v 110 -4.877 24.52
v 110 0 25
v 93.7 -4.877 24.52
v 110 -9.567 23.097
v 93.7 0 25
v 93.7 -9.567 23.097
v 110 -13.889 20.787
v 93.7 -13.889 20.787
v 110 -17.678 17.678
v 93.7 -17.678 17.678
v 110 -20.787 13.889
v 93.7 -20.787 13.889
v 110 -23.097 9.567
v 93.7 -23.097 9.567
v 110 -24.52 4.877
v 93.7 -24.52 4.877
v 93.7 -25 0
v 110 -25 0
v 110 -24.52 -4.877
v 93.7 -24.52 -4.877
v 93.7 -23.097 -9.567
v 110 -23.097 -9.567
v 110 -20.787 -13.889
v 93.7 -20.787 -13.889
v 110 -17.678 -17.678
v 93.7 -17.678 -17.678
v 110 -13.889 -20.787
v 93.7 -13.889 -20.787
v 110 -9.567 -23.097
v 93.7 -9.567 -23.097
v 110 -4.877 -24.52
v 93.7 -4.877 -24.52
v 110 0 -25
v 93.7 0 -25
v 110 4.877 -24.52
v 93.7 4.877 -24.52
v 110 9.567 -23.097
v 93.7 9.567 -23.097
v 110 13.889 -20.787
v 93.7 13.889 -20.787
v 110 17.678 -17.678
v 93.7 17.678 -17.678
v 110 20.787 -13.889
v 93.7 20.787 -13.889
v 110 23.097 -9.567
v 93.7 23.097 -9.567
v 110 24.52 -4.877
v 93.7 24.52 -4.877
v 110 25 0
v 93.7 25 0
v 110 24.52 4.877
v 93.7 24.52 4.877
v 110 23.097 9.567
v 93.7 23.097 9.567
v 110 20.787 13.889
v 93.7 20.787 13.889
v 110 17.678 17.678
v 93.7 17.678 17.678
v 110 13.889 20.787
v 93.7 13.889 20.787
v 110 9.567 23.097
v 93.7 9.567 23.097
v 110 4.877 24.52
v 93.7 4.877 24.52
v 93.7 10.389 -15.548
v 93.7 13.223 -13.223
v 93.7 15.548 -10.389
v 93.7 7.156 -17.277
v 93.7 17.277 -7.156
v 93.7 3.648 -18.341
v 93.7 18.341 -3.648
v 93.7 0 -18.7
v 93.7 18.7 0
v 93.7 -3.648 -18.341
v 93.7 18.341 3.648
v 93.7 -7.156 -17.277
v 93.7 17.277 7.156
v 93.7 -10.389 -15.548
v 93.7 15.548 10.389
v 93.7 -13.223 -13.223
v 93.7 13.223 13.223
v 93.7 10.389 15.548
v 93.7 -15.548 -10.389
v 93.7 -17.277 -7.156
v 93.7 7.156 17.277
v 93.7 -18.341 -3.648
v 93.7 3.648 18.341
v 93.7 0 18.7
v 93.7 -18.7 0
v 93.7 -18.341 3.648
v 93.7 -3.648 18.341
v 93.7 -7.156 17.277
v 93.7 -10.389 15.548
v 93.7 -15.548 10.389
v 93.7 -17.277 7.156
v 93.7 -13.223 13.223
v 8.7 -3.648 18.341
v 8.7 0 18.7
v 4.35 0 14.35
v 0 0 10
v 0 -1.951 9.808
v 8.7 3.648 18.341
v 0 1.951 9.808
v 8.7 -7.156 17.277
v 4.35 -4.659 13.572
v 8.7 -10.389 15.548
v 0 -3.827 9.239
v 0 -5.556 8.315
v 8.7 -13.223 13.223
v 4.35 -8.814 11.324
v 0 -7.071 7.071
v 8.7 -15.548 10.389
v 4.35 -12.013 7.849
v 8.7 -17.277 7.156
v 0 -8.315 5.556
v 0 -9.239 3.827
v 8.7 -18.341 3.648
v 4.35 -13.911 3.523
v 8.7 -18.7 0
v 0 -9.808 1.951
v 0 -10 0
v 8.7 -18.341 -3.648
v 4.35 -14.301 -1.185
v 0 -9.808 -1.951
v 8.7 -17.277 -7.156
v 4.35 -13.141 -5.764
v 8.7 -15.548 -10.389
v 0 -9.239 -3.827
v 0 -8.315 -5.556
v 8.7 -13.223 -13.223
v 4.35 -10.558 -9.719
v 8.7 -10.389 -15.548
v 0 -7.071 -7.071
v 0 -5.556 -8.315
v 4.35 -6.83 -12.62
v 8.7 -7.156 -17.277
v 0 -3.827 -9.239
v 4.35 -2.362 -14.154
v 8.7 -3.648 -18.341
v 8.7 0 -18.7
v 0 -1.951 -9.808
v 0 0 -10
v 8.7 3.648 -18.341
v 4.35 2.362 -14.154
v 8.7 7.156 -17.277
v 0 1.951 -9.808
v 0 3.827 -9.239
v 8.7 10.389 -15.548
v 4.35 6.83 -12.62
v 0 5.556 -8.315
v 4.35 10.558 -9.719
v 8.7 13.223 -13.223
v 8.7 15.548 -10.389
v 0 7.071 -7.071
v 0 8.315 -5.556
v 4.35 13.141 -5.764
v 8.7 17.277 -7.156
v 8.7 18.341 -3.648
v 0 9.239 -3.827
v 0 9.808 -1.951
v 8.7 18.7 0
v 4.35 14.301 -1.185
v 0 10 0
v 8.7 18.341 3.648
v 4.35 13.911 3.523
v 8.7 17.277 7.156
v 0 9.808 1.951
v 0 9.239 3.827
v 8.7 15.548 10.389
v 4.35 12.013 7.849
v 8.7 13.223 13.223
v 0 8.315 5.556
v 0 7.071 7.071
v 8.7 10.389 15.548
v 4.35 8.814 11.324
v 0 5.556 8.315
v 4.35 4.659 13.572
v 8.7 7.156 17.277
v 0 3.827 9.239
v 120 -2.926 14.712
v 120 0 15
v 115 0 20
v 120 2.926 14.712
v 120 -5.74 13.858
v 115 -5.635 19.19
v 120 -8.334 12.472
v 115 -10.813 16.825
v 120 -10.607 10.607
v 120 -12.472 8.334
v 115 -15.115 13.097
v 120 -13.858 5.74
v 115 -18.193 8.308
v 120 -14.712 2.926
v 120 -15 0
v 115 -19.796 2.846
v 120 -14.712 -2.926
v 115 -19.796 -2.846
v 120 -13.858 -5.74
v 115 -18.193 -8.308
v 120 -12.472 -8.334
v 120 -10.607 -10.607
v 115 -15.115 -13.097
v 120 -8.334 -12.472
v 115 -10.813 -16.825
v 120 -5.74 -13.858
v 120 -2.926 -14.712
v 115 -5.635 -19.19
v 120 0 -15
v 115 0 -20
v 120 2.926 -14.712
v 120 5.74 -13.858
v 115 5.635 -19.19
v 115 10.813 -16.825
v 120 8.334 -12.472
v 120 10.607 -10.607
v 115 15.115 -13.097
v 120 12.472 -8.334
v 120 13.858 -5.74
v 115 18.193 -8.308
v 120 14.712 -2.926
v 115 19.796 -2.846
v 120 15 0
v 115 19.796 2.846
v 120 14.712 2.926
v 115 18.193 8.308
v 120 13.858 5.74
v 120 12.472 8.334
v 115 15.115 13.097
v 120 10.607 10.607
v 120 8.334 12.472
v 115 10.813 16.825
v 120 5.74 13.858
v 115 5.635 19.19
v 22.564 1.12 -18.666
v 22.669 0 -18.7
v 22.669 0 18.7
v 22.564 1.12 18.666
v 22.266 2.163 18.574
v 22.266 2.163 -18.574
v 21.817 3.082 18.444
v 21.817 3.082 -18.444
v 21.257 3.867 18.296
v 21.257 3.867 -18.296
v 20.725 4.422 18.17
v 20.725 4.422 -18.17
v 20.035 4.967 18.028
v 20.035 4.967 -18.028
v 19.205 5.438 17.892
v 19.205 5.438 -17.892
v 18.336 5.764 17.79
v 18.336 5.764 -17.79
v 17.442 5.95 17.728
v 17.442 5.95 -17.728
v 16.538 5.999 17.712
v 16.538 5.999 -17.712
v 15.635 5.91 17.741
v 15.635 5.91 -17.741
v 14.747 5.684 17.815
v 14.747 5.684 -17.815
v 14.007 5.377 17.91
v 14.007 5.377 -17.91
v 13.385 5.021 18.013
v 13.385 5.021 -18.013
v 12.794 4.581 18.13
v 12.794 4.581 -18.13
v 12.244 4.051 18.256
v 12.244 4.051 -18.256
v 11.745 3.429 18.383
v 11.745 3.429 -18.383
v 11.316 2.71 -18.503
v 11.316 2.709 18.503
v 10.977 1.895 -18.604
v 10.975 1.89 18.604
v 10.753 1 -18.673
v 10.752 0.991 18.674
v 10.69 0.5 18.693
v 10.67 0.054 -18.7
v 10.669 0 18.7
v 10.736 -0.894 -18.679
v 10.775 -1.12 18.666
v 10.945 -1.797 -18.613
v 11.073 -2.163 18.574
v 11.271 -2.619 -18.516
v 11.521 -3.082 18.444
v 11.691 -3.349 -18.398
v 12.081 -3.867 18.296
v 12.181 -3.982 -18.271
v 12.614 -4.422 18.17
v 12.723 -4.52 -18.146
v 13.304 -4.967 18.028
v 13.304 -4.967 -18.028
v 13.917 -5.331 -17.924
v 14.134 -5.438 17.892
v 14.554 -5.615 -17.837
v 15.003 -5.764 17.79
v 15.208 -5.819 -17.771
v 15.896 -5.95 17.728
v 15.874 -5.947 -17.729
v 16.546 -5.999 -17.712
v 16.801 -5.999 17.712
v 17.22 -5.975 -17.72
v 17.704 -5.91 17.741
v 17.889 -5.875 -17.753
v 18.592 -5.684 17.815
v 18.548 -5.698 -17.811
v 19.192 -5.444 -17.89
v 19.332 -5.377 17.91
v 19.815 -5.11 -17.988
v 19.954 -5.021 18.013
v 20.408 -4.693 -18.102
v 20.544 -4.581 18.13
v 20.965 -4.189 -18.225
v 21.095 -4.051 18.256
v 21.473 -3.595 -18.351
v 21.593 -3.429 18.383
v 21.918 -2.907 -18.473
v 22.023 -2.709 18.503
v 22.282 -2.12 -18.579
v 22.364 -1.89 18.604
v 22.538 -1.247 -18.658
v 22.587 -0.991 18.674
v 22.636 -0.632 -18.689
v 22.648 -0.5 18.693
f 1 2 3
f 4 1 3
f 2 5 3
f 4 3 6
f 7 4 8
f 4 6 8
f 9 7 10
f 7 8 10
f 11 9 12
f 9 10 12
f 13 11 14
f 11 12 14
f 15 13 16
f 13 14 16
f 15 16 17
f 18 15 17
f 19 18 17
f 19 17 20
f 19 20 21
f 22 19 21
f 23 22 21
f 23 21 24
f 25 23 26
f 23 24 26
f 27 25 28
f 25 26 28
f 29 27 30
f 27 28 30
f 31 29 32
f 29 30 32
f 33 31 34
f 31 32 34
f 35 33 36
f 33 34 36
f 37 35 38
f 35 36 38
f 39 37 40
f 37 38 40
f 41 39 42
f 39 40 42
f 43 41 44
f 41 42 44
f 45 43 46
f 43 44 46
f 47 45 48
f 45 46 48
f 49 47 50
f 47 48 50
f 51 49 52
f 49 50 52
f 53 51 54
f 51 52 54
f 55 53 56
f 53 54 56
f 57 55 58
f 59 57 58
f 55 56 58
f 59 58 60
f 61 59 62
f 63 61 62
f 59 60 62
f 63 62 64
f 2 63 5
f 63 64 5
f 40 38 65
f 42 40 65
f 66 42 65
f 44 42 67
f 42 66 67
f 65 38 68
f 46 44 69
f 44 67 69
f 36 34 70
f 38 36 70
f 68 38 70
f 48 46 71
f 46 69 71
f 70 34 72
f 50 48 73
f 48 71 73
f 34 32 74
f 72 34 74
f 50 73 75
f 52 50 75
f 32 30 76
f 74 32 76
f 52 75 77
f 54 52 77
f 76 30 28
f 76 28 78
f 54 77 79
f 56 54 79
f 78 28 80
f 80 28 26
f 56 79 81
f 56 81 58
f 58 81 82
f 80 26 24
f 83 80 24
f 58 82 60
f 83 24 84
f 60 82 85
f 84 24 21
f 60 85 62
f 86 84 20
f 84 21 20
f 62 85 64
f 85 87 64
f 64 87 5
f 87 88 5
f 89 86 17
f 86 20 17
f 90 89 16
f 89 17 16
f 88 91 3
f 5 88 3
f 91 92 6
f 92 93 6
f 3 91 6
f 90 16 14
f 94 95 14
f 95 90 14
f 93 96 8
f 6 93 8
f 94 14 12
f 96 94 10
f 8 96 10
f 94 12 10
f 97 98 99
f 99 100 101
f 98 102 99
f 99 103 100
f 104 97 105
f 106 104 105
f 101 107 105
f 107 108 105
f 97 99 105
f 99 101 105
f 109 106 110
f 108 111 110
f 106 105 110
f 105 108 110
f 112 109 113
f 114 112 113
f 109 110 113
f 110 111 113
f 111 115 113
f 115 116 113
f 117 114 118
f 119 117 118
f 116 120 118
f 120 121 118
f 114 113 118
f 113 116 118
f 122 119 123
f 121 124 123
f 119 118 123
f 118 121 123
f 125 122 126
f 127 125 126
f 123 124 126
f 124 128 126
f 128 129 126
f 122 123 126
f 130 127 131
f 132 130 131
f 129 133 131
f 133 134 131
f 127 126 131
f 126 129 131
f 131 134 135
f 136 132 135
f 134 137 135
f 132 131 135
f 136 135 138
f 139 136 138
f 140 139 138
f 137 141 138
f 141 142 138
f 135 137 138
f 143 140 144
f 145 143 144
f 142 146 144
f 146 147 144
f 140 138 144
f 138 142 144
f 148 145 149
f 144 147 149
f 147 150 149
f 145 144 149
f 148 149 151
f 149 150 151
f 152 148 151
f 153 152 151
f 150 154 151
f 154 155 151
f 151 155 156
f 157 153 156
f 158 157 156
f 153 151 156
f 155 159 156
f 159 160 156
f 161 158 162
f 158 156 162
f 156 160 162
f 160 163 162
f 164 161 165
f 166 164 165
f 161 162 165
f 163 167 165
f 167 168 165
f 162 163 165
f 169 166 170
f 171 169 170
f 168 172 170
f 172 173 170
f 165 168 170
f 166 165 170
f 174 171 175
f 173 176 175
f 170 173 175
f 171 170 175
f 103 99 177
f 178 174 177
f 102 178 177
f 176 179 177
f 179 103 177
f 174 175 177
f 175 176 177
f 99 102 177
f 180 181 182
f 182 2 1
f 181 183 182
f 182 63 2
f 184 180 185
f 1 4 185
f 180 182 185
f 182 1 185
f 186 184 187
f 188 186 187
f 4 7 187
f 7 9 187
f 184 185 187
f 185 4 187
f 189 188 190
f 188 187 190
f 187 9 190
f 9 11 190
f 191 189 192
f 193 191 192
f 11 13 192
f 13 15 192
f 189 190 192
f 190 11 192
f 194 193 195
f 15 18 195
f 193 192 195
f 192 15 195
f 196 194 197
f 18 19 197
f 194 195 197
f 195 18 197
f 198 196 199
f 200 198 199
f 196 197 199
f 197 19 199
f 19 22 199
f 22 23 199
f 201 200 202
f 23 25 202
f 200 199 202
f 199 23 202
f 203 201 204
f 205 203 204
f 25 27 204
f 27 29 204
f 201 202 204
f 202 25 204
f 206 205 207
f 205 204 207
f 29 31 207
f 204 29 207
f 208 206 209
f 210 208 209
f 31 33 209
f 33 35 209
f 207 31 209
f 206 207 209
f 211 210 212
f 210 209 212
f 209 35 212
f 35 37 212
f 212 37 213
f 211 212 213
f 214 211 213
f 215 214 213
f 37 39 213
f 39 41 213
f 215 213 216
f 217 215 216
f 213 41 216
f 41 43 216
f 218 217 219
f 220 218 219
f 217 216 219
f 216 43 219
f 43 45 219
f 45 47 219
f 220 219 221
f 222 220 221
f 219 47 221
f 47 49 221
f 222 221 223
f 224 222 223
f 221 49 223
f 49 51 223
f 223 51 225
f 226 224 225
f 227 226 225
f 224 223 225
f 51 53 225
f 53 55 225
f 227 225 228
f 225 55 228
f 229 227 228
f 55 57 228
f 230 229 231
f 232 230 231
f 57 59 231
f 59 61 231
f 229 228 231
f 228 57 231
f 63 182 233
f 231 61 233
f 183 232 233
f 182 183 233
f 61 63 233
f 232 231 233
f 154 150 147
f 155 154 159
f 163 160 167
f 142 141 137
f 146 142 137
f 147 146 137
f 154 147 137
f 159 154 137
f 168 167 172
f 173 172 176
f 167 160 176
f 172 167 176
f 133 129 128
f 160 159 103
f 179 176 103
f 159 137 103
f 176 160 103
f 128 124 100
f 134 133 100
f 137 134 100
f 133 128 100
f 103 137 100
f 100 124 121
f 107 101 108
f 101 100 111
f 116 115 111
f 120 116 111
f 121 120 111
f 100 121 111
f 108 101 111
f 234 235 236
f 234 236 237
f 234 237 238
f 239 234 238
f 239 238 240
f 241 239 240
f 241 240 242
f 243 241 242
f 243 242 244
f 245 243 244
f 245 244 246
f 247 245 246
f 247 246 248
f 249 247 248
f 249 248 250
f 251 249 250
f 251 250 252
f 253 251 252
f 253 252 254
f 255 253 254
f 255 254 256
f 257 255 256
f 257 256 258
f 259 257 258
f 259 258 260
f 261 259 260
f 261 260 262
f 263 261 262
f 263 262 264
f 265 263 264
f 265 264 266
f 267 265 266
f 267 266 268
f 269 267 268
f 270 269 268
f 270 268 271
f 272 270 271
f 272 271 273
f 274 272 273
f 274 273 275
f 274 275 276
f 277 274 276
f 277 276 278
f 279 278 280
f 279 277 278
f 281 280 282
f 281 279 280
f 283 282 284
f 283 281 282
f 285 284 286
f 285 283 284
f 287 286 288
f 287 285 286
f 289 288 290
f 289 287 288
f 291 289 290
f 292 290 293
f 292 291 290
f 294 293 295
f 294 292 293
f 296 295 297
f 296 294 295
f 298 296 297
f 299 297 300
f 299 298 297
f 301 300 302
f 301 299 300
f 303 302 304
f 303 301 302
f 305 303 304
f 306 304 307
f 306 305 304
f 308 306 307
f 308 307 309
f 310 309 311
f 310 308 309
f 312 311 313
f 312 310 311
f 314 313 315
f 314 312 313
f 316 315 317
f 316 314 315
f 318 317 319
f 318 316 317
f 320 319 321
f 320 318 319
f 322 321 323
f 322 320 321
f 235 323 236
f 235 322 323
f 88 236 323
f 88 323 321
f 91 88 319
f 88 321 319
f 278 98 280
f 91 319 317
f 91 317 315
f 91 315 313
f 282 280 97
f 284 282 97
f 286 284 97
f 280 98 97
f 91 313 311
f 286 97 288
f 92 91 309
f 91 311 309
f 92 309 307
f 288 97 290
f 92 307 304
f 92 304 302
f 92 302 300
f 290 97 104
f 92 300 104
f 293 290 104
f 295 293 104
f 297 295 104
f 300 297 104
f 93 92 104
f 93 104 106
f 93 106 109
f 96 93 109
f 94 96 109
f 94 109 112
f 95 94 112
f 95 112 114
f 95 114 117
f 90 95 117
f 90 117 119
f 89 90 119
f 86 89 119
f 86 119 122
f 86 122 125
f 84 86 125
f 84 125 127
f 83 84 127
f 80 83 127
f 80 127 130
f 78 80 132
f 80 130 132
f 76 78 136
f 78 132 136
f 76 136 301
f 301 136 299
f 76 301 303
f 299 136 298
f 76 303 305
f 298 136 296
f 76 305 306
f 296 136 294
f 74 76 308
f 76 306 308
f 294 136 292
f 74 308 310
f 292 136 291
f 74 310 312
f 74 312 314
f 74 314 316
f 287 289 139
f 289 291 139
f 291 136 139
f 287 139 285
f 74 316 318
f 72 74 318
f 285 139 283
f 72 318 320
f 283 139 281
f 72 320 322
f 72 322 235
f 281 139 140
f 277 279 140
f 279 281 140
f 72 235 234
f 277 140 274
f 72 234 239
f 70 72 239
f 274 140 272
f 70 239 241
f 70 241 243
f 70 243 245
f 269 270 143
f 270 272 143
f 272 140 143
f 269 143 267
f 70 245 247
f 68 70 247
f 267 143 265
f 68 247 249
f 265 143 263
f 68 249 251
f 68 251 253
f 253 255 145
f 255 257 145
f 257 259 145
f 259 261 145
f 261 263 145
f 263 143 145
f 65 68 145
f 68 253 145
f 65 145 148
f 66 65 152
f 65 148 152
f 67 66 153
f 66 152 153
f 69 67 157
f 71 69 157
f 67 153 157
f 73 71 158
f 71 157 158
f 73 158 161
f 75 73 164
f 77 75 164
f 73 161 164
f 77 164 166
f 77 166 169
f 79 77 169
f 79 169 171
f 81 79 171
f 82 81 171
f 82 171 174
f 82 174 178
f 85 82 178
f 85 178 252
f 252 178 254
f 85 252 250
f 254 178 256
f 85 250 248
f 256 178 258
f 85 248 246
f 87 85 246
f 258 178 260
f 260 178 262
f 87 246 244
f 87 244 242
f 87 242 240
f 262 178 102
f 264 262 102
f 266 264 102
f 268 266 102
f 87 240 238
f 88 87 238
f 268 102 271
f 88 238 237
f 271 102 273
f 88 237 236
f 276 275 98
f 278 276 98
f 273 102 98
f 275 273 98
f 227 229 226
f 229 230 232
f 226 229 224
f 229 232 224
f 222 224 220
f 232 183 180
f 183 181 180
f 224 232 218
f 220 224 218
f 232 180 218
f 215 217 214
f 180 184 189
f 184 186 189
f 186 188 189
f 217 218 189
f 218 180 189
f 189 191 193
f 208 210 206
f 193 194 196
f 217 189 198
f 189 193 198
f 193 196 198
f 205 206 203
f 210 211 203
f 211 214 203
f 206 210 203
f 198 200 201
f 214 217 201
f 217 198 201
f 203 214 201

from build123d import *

# Parameters (mm, degrees)
CUT_EXTRUDE1_DEPTH      = 126.099960032
CUT_EXTRUDE1_DEPTH_BACK = 126.099960032
SKETCH3_R               = 6


with BuildPart() as part:
    # Sketch2 → Revolve1 (revolve)
    with BuildSketch(Plane.XY, mode=Mode.PRIVATE) as revolve1_sk:
        Polygon((0, 0), (120, 0), (120, -15), (110, -25), (93.7, -25), (93.7, -18.7), (8.7, -18.7), (0, -10), align=None)
    revolve(revolve1_sk.sketch.rotate(Axis((0, 0, 0), (1, 0, 0)), 270), axis=Axis((0, 0, 0), (1, 0, 0)))

    # Sketch3 → Cut-Extrude1 (cut, two sides: drawn at the far end of the back side and taken through both)
    with BuildSketch(Plane.XY.offset(-CUT_EXTRUDE1_DEPTH_BACK)):
        with Locations((16.669361572, 0)):
            Circle(SKETCH3_R)
    extrude(amount=CUT_EXTRUDE1_DEPTH + CUT_EXTRUDE1_DEPTH_BACK, mode=Mode.SUBTRACT)


solid = part.part
